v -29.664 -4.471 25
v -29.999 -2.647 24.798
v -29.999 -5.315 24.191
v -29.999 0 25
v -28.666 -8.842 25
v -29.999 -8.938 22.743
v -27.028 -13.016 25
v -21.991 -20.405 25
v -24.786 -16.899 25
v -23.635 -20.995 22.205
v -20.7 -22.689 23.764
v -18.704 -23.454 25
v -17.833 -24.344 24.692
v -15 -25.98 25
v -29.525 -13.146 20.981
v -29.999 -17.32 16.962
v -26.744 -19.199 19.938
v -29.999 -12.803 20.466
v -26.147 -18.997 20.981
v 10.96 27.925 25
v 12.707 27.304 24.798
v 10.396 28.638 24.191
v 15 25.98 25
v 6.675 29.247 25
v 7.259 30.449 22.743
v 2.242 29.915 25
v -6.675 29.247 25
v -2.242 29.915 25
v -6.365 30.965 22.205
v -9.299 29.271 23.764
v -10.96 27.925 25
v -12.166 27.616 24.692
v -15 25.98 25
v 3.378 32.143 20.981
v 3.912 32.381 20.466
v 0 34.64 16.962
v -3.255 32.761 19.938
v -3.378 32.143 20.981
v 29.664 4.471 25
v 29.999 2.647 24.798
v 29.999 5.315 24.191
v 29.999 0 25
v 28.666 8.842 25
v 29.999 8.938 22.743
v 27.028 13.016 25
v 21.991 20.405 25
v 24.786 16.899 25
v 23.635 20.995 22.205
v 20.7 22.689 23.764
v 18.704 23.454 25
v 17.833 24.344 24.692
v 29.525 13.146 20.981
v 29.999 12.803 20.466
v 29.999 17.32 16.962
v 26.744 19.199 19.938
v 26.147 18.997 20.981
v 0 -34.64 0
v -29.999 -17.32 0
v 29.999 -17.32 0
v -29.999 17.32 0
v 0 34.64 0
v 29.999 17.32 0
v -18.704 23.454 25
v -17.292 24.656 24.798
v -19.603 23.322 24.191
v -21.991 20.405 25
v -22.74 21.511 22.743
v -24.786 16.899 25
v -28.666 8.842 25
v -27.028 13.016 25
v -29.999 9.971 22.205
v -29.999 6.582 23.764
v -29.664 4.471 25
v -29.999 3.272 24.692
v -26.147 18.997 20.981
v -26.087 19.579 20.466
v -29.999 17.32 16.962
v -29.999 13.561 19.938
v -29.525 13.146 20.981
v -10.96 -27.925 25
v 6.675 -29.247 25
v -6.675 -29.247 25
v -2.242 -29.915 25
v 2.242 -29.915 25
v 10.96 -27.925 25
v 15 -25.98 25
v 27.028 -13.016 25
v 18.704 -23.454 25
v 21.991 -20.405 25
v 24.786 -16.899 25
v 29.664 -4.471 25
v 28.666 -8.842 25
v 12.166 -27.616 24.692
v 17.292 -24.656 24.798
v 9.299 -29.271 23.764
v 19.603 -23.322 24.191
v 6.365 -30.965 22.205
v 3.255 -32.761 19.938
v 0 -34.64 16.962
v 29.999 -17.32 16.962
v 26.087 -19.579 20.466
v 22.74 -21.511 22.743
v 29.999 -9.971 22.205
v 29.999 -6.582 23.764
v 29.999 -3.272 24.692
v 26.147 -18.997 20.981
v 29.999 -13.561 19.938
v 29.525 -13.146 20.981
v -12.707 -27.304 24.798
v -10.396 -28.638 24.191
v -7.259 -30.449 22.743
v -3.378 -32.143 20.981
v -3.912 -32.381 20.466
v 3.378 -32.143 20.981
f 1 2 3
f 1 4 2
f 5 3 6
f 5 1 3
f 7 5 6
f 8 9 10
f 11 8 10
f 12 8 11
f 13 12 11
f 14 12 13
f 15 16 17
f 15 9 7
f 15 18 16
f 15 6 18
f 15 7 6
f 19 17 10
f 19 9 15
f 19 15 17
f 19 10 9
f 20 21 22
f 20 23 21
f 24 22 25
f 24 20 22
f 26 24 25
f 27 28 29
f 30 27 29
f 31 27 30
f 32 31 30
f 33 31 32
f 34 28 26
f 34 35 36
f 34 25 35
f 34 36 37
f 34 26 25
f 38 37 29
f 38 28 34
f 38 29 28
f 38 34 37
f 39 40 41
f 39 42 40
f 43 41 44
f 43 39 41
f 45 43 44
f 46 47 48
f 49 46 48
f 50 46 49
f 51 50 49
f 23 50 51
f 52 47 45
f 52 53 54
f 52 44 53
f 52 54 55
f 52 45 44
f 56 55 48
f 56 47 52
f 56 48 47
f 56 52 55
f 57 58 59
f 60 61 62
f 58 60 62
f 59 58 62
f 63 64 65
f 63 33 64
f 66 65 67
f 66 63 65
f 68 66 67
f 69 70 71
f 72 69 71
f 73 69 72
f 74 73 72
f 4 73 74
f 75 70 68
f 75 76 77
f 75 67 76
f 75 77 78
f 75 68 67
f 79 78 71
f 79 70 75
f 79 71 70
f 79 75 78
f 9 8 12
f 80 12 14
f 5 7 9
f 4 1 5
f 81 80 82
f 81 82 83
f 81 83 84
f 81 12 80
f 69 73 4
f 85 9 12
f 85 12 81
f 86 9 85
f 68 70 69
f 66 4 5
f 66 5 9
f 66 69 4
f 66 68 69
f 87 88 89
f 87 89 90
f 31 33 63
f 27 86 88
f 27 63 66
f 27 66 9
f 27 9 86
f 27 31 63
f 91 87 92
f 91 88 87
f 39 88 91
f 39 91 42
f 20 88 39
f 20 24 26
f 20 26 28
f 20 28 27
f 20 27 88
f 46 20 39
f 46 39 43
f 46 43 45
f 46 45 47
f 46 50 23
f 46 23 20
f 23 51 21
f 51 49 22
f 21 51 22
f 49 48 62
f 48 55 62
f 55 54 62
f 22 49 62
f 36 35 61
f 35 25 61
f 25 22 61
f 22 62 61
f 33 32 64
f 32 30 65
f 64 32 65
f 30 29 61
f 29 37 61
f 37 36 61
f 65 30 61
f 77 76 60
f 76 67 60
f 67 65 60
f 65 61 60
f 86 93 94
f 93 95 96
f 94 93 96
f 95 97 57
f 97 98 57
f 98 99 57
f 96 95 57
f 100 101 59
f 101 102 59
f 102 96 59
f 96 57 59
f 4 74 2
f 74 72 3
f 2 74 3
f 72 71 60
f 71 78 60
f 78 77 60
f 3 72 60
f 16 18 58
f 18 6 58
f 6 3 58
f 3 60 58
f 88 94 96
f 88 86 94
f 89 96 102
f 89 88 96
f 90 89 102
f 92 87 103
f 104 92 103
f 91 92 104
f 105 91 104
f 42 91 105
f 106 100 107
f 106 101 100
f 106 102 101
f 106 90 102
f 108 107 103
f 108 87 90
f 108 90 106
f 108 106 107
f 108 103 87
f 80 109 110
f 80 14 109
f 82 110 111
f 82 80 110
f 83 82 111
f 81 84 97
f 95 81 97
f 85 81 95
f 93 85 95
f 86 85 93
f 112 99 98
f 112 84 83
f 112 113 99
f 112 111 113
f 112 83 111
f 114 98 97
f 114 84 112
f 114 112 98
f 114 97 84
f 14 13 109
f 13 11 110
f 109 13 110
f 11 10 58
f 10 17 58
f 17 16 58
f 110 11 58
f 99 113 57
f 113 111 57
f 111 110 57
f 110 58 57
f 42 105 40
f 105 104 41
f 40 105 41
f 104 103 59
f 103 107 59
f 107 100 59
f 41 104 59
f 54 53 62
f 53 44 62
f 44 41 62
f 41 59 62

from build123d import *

# Parameters (mm, degrees)
BOSS_EXTRUDE1_DEPTH = 25
SKETCH2_OUTSIDE_W   = 142.428
SKETCH2_OUTSIDE_H   = 151.71
SKETCH2_OUTSIDE_R   = 29.999119987
CUT_EXTRUDE2_DEPTH  = 53.200352489
CUT_EXTRUDE2_DRAFT  = -30


with BuildPart() as part:
    # Sketch1 → Boss-Extrude1 (new body)
    with BuildSketch(Plane.XY):
        Polygon((0, -34.64), (29.999119987, -17.32), (29.999119987, 17.32), (0, 34.64), (-29.999119987, 17.32), (-29.999119987, -17.32), align=None)
    extrude(amount=BOSS_EXTRUDE1_DEPTH)


with BuildPart() as cut_extrude2_tool:
    # Sketch2 outside → Cut-Extrude2 (with draft: the straight prism first)
    with BuildSketch(Plane.XY.offset(25)):
        Rectangle(SKETCH2_OUTSIDE_W, SKETCH2_OUTSIDE_H)
        Circle(SKETCH2_OUTSIDE_R, mode=Mode.SUBTRACT)
    extrude(amount=-CUT_EXTRUDE2_DEPTH)
    # Cut-Extrude2: the draft: its side faces are tilted about the plane it starts from
    cut_extrude2_sides = [cut_extrude2_tool.faces().sort_by_distance(p)[0] for p in [
        (0, -75.855, -1.600176245),
        (71.214, 0, -1.600176245),
        (0, 75.855, -1.600176245),
        (-71.214, 0, -1.600176245),
        (-29.999119987, 0, -1.600176245),
    ]]
    draft(cut_extrude2_sides, Plane.XY.offset(25), CUT_EXTRUDE2_DRAFT)


with BuildPart() as part_1:
    add(part.part)

    # Cut-Extrude2: cut by cut_extrude2_tool
    add(cut_extrude2_tool.part, mode=Mode.SUBTRACT)


solid = part_1.part
